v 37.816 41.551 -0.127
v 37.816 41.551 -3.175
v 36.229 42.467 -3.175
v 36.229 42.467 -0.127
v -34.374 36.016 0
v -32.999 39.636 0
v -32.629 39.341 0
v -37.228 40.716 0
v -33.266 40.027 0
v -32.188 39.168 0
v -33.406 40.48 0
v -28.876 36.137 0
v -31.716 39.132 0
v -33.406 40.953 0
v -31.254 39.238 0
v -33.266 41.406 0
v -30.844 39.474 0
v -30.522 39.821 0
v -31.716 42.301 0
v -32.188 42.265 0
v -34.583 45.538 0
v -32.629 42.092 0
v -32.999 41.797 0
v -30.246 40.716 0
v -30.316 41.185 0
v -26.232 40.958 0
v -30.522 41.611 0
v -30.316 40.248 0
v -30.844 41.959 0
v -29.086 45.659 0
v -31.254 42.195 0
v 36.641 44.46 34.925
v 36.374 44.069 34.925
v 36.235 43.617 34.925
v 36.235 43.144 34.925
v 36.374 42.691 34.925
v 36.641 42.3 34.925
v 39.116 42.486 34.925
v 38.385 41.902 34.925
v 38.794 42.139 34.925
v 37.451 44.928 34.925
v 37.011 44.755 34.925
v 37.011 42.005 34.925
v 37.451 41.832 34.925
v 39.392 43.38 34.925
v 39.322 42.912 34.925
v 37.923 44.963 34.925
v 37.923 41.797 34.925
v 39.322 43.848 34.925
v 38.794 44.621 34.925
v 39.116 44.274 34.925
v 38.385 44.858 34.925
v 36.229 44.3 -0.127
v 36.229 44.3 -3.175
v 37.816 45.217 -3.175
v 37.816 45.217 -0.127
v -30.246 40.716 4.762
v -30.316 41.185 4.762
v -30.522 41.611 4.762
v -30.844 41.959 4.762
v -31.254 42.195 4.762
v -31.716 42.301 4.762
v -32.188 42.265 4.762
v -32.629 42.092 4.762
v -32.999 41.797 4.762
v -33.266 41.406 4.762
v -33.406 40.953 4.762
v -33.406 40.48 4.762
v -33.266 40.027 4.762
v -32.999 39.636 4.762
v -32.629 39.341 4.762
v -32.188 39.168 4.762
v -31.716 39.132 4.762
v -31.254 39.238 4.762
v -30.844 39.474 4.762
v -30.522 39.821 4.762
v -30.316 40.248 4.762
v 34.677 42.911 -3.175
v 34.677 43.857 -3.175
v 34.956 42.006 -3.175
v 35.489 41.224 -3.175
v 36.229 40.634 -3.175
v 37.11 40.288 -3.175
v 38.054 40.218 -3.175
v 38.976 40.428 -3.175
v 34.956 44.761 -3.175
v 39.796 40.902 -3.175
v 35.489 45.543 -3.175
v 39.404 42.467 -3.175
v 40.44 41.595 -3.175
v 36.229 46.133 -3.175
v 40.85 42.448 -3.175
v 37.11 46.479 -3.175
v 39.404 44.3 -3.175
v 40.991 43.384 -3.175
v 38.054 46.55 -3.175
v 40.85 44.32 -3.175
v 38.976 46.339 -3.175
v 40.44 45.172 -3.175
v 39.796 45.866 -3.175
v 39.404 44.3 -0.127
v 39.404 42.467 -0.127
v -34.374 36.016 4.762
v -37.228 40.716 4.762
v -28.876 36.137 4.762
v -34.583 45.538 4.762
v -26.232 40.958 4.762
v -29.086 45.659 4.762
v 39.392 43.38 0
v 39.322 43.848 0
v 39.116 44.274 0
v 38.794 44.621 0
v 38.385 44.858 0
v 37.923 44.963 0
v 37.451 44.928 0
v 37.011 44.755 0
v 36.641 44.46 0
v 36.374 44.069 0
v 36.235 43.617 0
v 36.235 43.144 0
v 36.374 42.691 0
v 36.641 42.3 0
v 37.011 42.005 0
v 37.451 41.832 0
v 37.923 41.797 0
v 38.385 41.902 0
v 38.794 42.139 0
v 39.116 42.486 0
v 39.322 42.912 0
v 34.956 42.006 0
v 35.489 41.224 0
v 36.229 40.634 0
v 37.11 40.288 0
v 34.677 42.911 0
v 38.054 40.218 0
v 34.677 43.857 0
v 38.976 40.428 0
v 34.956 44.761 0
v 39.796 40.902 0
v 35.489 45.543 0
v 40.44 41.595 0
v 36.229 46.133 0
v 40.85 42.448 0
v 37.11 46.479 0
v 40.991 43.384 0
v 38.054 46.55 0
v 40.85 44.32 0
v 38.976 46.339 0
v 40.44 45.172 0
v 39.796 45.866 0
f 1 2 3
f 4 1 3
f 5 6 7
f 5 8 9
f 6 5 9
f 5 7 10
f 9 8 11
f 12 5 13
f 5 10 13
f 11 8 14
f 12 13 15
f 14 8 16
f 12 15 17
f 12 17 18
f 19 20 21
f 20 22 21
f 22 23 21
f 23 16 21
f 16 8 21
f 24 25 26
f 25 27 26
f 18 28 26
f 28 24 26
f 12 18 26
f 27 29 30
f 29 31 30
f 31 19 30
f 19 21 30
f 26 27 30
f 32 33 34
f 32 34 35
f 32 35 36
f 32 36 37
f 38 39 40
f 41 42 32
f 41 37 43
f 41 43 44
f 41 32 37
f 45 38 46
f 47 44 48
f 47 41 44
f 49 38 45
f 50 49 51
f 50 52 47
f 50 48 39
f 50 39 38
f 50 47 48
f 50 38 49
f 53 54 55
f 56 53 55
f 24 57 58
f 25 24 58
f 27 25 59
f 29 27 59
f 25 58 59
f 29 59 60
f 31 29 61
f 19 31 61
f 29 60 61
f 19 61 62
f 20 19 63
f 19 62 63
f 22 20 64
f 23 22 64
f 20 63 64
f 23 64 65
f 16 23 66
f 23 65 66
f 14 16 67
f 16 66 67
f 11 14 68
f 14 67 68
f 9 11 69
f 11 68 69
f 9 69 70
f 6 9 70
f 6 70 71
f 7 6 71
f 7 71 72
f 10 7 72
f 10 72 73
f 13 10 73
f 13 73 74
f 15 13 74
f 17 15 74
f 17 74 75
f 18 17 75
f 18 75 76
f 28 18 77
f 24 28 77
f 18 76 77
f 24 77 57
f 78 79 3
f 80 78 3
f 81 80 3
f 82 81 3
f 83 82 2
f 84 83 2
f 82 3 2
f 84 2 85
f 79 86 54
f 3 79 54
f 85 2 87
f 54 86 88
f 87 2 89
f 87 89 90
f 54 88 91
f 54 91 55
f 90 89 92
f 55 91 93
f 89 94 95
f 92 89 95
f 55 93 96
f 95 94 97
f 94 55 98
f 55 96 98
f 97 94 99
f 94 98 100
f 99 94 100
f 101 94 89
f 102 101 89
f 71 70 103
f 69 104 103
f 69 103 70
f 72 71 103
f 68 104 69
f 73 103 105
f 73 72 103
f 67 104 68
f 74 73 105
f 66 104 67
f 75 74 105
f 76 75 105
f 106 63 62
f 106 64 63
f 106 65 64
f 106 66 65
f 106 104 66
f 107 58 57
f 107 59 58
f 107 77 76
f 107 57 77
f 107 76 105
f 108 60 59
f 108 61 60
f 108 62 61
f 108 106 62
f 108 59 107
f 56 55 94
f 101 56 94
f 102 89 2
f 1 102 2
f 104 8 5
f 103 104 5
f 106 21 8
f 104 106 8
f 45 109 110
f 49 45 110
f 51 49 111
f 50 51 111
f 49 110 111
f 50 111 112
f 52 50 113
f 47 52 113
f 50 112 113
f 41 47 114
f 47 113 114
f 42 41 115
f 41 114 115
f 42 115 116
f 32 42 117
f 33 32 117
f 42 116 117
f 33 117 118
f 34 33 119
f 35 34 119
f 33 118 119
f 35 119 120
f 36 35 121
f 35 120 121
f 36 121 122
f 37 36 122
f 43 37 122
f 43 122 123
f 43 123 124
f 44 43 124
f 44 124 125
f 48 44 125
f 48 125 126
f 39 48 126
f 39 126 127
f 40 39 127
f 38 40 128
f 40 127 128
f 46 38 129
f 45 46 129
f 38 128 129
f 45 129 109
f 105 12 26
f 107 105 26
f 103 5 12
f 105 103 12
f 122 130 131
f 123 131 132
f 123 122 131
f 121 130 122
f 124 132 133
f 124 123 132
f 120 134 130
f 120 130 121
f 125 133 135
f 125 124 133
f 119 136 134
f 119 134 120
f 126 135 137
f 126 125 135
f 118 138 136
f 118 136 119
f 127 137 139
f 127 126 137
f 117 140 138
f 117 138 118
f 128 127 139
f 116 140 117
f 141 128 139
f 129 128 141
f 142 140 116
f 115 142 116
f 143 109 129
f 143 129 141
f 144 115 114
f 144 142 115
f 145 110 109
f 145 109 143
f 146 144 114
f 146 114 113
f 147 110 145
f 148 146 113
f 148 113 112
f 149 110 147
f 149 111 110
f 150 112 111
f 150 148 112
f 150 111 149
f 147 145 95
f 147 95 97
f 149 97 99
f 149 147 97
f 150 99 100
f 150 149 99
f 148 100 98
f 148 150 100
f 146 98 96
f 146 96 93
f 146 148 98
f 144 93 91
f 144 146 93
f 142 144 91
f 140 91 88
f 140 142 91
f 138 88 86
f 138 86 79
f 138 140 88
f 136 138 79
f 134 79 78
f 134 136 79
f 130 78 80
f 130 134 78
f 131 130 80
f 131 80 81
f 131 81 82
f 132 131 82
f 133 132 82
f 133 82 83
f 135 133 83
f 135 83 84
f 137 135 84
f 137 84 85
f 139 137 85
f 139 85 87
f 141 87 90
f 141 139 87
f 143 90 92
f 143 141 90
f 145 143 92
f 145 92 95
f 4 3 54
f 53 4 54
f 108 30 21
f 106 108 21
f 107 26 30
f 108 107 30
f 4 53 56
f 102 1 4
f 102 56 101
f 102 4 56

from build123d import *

# Parameters (mm, degrees)
F1_DEPTH = 4.7625
F2_R     = 1.588799
F3_DEPTH = 4.7625
F5_R     = 1.5875
F6_DEPTH = 34.925
F4_R     = 3.175
F7_DEPTH = 3.175
F9_DEPTH = 3.048


with BuildPart() as f1:
    # F0 (on Top) → F1 (new body)
    with BuildSketch(Plane.XY):
        Polygon((-28.876085, 36.136542), (-26.23186, 40.958363), (-29.085567, 45.659239), (-34.583498, 45.538294), (-37.227723, 40.716474), (-34.374016, 36.015598), align=None)
    extrude(amount=F1_DEPTH)

    # F2 (on face) → F3 (cut)
    with BuildSketch(Plane.XY.offset(4.7625)):
        with Locations((-31.834532, 40.716474)):
            Circle(F2_R)
    extrude(amount=-F3_DEPTH, mode=Mode.SUBTRACT)


with BuildPart() as f6:
    # F5 (on face) → F6 (new body)
    with BuildSketch(Plane.XY):
        with Locations((37.804537, 43.380134)):
            Circle(F5_R)
    extrude(amount=F6_DEPTH)

    # F4 (on Top) → F7 (join)
    with BuildSketch(Plane.XY):
        with Locations((37.816323, 43.383829)):
            Circle(F4_R)
    extrude(amount=-F7_DEPTH)

    # F8 (on face) → F9 (cut)
    with BuildSketch(Plane(origin=(0, 0, -3.175), x_dir=(1, 0, 0), z_dir=(0, 0, -1))):
        Polygon((39.403823, -44.300373), (39.403823, -42.467286), (37.816323, -41.550742), (36.228823, -42.467286), (36.228823, -44.300373), (37.816323, -45.216916), align=None)
    extrude(amount=-F9_DEPTH, mode=Mode.SUBTRACT)


solid = Compound([f1.part, f6.part])
